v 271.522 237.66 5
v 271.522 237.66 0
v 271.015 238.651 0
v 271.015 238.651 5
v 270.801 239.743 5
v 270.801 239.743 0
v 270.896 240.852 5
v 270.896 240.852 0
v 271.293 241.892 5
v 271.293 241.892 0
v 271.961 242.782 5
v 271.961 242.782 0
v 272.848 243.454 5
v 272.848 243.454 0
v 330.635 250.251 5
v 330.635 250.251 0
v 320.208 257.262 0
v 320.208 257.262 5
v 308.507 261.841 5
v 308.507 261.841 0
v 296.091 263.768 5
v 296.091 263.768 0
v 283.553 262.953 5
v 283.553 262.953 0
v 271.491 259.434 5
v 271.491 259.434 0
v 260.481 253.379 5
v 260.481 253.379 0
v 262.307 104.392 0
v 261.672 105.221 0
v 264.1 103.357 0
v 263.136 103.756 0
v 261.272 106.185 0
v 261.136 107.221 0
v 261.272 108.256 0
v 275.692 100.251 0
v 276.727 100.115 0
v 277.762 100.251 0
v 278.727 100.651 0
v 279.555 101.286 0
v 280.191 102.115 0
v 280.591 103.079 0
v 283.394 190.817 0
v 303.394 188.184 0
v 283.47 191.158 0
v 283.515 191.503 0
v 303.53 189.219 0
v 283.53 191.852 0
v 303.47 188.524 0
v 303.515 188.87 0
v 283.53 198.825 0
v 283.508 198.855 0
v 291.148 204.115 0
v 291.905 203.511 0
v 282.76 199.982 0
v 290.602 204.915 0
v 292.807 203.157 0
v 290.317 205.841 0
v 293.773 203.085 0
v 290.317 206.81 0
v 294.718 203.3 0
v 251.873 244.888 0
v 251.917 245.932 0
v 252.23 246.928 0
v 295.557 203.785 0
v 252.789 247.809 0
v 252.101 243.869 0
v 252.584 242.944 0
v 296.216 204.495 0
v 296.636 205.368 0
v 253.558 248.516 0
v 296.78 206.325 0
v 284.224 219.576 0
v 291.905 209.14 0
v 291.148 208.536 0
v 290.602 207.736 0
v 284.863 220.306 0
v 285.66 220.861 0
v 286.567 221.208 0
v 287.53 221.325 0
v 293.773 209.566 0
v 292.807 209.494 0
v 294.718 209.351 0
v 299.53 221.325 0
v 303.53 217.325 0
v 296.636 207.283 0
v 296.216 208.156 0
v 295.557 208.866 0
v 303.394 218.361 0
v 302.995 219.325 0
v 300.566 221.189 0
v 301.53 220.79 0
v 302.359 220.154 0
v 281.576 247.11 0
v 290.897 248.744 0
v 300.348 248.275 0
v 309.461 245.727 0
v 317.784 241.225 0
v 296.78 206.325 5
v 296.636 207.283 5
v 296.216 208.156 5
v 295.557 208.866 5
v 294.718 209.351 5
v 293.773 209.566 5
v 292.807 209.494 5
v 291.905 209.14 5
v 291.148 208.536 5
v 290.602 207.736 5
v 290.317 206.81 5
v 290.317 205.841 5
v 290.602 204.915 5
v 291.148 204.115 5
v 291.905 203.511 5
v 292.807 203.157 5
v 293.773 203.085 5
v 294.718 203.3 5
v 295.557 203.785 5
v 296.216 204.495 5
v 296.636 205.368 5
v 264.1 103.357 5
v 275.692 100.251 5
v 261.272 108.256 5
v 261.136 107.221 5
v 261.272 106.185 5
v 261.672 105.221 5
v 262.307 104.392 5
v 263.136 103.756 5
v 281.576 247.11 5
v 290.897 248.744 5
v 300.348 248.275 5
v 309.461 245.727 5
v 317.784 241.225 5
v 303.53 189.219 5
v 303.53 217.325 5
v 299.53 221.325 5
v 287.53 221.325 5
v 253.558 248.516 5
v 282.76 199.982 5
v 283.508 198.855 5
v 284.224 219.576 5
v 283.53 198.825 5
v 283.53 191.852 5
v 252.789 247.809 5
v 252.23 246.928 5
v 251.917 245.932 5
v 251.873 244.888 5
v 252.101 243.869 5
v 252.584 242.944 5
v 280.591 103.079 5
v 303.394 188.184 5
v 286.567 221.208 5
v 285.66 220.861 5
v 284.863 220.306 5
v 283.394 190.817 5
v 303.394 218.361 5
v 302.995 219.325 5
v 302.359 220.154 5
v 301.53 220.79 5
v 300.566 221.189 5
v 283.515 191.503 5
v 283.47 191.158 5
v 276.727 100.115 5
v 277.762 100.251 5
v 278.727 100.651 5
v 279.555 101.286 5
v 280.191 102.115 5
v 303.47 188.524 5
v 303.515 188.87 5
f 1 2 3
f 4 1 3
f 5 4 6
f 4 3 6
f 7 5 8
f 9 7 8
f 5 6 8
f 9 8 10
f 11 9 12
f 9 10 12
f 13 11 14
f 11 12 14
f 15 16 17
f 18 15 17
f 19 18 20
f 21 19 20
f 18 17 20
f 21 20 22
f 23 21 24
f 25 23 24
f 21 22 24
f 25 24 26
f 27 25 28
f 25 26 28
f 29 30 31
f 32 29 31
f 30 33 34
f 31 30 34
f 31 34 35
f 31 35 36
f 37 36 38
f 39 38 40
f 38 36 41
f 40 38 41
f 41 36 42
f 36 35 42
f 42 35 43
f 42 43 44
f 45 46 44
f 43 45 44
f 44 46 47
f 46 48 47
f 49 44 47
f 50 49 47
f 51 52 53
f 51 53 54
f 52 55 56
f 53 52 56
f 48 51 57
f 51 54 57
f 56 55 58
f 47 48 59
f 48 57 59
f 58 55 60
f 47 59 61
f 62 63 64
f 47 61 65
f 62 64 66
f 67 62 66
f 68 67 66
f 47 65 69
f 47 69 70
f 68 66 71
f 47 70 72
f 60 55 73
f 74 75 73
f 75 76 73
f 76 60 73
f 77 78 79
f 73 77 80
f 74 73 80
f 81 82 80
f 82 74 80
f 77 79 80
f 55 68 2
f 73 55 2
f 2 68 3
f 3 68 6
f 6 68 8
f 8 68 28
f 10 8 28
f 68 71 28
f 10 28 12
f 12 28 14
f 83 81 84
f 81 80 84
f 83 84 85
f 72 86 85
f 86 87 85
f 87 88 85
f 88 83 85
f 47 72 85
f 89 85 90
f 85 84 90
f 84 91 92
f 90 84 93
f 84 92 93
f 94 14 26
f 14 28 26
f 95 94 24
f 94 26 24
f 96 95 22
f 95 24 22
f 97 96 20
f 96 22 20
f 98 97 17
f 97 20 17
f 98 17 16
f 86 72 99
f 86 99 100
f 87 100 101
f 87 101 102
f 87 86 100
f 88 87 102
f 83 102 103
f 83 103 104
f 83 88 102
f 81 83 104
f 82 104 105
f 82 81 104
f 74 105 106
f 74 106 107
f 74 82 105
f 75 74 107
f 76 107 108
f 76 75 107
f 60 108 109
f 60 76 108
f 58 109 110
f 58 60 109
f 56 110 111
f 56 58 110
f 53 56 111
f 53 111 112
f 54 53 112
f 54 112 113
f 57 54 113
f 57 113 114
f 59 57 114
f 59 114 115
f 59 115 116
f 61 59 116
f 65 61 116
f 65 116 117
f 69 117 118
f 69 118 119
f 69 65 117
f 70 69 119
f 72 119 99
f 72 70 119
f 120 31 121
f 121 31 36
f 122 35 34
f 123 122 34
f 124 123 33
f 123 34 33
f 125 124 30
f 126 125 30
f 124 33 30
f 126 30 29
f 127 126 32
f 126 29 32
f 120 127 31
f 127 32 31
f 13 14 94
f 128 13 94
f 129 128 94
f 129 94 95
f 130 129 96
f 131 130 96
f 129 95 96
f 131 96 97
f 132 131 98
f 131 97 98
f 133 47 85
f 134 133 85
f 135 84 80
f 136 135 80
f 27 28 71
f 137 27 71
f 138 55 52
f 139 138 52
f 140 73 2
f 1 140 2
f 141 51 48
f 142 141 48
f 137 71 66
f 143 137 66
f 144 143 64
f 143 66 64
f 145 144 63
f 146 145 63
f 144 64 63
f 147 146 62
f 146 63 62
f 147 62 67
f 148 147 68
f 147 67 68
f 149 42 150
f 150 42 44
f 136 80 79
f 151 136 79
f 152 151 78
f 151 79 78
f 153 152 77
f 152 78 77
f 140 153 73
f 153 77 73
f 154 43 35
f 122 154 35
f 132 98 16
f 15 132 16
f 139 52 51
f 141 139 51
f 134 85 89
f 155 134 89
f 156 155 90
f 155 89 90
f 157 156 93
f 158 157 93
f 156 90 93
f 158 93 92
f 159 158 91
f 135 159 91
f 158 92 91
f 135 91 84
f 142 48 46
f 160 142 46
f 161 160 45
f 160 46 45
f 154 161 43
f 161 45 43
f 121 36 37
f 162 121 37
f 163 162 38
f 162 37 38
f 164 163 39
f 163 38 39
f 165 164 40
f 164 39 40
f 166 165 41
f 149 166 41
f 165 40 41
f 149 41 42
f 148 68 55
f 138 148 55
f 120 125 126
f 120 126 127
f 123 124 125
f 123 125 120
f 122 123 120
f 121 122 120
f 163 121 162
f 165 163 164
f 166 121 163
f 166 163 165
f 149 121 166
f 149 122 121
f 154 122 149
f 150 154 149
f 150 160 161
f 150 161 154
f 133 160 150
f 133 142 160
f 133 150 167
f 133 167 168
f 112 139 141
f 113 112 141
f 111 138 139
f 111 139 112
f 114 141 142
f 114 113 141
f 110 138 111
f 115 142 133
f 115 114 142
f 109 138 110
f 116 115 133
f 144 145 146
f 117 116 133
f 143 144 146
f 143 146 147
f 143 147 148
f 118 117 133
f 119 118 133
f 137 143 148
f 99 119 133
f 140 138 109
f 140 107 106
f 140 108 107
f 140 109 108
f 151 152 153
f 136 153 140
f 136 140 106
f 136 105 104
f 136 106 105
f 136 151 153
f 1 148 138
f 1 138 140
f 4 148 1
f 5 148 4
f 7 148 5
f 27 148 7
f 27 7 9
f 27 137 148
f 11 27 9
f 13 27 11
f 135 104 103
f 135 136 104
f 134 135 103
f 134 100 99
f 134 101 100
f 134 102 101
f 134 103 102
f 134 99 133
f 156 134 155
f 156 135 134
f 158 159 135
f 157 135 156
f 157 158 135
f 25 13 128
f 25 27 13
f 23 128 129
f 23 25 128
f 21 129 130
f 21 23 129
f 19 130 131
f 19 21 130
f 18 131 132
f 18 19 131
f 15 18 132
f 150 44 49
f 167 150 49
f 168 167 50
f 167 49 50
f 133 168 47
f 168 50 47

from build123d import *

# Parameters (mm, degrees)
MODEL_R             = 3.25
MODEL_R_2           = 2.075
BOSS_EXTRUDE1_DEPTH = 5


with BuildPart() as part:
    # Model → Boss-Extrude1 (new body)
    with BuildSketch(Plane.XY):
        with BuildLine():
            Line((299.530455157, 221.325483104), (287.530455157, 221.325483104))
            ThreePointArc((287.530455157, 221.325483104), (284.702028033, 220.153910229), (283.530455157, 217.325483104))
            Line((283.530455157, 217.325483104), (283.530455157, 191.852093095))
            ThreePointArc((283.530455157, 191.852093095), (283.496234603, 191.329988326), (283.394158462, 190.816816914))
            Line((283.394158462, 190.816816914), (261.272017278, 108.255862044))
            ThreePointArc((261.272017278, 108.255862044), (261.671618968, 105.220585863), (264.100444403, 103.356882558))
            Line((264.100444403, 103.356882558), (275.691554319, 100.251054017))
            ThreePointArc((275.691554319, 100.251054017), (278.726830499, 100.650655707), (280.590533804, 103.079481141))
            Line((280.590533804, 103.079481141), (303.394158462, 188.183766963))
            ThreePointArc((303.394158462, 188.183766963), (303.496234603, 188.696938374), (303.530455157, 189.219043143))
            Line((303.530455157, 189.219043143), (303.530455157, 217.325483104))
            ThreePointArc((303.530455157, 217.325483104), (302.358882282, 220.153910229), (299.530455157, 221.325483104))
        make_face()
        with Locations((293.530455157, 206.325483104)):
            Circle(MODEL_R, mode=Mode.SUBTRACT)
        with Locations((293.530455157, 214.325483104)):
            Circle(MODEL_R_2, mode=Mode.SUBTRACT)
        with Locations((293.530455157, 198.325483104)):
            Circle(MODEL_R_2, mode=Mode.SUBTRACT)
        with BuildLine():
            ThreePointArc((330.635106632, 250.251498618), (296.090916254, 263.768446459), (260.481102457, 253.378541305))
            Line((260.481102457, 253.378541305), (253.558218086, 248.516012577))
            ThreePointArc((253.558218086, 248.516012577), (251.917062939, 245.931599145), (252.584047269, 242.943670949))
            Line((252.584047269, 242.943670949), (282.759543213, 199.982183026))
            Line((282.759543213, 199.982183026), (283.508108229, 198.855371857))
            Line((283.508108229, 198.855371857), (283.530455157, 198.825483104))
            Line((283.530455157, 198.825483104), (283.530455157, 217.325483104))
            ThreePointArc((283.530455157, 217.325483104), (283.70765552, 218.5028543), (284.223556624, 219.575910195))
            Line((284.223556624, 219.575910195), (271.521515193, 237.660073602))
            ThreePointArc((271.521515193, 237.660073602), (270.895698021, 240.852034508), (272.848206871, 243.453566893))
            ThreePointArc((272.848206871, 243.453566893), (295.63531403, 248.773328387), (317.784347872, 241.225321044))
            Line((317.784347872, 241.225321044), (330.635106632, 250.251498618))
        make_face()
        with Locations((293.530455157, 198.325483104)):
            Circle(MODEL_R_2)
        with Locations((293.530455157, 214.325483104)):
            Circle(MODEL_R_2)
    extrude(amount=BOSS_EXTRUDE1_DEPTH)


solid = part.part
